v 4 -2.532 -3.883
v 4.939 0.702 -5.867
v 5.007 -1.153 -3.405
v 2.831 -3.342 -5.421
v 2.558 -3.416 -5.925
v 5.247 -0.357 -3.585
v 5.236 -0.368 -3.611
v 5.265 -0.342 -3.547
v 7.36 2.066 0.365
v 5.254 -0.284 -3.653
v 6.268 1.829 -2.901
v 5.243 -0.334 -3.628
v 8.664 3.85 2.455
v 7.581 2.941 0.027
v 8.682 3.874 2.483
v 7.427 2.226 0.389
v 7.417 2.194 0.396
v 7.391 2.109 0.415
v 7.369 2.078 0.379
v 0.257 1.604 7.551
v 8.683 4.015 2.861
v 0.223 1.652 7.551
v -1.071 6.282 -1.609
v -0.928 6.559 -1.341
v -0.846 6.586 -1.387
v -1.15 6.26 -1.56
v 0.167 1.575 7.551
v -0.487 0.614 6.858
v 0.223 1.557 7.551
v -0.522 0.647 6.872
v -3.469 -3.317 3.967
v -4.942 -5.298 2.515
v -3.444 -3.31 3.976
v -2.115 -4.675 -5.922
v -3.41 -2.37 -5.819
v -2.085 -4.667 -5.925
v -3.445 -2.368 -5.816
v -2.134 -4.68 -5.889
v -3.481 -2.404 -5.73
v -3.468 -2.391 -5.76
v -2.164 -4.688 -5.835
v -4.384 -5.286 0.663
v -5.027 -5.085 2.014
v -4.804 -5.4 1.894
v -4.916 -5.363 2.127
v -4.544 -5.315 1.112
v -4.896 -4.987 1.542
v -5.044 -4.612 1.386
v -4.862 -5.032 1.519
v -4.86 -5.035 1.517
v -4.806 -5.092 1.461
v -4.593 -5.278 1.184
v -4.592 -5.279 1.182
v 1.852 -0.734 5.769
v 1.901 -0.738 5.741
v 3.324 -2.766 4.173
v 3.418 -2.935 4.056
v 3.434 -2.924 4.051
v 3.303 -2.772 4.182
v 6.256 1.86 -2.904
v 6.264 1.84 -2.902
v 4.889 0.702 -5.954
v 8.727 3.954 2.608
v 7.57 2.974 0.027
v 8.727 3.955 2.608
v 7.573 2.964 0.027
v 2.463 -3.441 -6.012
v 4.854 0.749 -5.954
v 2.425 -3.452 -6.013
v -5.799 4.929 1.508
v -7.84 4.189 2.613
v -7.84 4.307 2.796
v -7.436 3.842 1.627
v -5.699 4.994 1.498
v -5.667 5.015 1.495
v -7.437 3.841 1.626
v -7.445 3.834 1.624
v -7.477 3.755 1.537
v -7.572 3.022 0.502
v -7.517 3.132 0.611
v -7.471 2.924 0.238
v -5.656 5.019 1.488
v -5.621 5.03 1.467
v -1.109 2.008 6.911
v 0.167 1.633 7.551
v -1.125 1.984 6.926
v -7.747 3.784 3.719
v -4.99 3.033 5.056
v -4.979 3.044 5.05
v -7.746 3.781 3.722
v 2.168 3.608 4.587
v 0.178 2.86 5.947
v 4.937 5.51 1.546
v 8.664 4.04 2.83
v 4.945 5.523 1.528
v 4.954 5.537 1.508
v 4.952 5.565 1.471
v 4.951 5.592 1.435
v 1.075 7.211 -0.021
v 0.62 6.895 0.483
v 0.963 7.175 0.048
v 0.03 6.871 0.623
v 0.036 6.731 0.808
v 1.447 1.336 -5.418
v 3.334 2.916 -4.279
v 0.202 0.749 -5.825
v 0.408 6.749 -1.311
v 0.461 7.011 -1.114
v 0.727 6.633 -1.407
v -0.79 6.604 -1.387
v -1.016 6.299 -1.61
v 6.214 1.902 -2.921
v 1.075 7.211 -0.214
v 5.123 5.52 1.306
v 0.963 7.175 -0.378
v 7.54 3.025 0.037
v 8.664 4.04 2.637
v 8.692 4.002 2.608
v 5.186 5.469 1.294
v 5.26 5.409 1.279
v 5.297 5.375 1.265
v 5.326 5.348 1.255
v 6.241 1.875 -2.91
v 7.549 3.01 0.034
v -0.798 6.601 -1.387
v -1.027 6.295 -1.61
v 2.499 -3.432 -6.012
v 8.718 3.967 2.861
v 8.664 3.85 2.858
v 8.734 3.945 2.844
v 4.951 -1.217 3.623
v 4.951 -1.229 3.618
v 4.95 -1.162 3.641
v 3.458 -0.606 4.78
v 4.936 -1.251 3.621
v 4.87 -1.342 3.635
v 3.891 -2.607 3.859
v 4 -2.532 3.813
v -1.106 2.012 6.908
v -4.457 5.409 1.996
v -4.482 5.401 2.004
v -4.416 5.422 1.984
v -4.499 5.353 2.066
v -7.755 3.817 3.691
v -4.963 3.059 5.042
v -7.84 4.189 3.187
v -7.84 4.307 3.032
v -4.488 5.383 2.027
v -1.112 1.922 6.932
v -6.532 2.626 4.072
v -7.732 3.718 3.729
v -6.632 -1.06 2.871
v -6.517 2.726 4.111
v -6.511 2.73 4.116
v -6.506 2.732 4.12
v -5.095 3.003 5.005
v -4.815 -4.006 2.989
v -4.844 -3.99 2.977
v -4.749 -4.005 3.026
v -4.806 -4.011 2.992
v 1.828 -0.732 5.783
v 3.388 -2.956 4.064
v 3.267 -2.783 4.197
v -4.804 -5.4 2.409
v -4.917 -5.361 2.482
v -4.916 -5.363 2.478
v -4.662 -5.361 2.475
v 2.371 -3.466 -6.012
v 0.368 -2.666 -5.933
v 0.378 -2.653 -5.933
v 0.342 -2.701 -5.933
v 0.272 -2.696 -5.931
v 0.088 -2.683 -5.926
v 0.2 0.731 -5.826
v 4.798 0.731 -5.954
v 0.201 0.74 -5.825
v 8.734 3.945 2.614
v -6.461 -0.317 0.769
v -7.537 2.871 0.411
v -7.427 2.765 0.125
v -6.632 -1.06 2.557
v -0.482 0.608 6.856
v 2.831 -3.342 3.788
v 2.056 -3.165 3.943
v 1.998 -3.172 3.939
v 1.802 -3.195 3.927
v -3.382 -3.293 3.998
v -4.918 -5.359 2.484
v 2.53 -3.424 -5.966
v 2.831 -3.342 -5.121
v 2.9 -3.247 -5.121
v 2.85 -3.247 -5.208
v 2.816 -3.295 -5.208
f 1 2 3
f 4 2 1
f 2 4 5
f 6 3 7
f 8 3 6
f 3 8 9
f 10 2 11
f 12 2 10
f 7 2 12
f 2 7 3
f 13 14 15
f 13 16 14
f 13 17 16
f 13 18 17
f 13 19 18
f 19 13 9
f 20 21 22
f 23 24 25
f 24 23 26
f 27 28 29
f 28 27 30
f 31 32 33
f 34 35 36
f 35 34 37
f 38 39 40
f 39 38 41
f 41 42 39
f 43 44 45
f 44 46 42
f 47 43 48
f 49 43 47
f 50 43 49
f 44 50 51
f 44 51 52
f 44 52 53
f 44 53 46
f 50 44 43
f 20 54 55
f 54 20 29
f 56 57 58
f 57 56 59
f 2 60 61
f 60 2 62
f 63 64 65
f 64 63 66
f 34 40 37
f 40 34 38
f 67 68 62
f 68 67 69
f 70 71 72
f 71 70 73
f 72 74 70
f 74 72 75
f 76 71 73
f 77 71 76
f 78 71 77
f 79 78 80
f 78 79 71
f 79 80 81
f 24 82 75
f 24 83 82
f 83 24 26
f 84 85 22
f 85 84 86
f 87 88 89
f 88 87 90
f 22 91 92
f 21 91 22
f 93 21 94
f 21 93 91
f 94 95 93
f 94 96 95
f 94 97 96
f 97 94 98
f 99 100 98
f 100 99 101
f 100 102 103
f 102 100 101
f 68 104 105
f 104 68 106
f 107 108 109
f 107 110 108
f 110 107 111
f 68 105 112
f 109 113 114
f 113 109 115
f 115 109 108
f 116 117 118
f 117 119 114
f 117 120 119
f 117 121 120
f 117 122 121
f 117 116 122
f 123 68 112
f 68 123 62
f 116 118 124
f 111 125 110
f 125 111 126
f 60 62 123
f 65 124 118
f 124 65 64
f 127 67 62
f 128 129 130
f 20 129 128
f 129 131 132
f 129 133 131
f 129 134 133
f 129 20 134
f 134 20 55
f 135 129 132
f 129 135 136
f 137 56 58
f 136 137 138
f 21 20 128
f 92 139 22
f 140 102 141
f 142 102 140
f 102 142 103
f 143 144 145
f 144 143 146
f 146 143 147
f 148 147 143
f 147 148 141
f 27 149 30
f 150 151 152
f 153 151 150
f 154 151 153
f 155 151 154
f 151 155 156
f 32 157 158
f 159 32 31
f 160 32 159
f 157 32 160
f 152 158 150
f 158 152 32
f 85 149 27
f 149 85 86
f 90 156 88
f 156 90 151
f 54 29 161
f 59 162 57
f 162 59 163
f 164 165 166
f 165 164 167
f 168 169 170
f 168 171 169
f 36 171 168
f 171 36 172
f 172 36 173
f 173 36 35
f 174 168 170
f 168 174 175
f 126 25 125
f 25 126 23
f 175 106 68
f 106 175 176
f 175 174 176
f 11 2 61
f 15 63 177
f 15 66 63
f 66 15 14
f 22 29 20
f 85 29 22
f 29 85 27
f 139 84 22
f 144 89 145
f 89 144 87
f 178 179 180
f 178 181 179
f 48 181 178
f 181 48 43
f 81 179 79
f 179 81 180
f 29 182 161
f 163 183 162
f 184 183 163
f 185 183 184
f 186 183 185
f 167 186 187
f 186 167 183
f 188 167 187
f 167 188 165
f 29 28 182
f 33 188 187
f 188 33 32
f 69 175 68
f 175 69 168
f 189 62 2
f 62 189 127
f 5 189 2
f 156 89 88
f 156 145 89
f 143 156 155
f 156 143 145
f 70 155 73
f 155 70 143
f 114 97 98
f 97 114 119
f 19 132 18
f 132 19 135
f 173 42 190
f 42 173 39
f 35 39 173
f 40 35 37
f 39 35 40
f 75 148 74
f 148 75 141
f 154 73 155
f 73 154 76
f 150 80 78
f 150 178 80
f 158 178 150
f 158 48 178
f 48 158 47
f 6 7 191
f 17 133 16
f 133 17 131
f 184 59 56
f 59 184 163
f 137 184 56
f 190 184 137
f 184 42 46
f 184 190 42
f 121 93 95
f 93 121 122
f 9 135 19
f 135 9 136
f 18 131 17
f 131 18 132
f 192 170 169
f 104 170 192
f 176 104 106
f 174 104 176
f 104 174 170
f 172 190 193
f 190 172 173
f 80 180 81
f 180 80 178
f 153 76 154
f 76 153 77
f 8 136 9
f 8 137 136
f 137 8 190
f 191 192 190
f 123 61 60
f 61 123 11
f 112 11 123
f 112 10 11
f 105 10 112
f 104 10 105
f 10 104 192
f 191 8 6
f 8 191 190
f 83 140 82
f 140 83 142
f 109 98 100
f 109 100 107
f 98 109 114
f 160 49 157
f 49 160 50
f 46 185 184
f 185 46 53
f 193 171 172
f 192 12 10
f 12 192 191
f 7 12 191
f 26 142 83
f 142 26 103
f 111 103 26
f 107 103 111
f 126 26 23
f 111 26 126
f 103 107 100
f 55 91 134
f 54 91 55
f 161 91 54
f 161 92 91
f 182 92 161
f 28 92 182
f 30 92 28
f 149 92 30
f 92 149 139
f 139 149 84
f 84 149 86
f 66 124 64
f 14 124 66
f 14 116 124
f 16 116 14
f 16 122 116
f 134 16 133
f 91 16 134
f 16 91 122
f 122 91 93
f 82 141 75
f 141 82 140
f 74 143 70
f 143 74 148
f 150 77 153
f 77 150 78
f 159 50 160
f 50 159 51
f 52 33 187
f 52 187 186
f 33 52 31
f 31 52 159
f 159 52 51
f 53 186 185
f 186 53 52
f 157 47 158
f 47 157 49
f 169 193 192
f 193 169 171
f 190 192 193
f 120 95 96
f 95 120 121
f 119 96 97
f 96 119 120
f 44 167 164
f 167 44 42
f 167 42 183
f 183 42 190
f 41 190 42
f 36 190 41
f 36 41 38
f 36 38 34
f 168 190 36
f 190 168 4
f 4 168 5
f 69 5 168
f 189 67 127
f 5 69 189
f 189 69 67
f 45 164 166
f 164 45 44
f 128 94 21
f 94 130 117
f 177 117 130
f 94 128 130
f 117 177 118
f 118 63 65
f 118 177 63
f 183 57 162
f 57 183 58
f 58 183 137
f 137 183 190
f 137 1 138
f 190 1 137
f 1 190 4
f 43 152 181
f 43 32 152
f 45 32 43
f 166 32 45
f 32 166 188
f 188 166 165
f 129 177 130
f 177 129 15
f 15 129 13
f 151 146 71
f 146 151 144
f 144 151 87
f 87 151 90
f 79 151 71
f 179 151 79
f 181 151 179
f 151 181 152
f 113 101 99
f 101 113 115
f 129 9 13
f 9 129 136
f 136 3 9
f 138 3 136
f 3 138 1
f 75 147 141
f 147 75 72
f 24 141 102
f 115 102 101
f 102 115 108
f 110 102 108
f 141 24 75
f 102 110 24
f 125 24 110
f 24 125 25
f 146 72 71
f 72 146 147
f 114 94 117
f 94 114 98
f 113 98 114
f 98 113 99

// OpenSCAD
// Auto-generated OpenSCAD file

    inner_points = 10*[[0.3968794289832836, -0.24366904809970863, 0.47769744652866364], [0.1044370337410087, 0.7116152041618212, 0.43400027446809336], [0.28001866757022104, -0.32472141302800633, -0.512137931997225], [-0.012423727672053866, 0.6305628392335235, -0.5558351040577953], [-0.483509439683674, -0.5304611105401444, 0.0999862435594168], [-0.7759518349259489, 0.4248231417213853, 0.05628907149884649], [-0.45353704140965617, 0.039673656440986374, 0.9209905083602004], [-0.6550920403237519, -0.10012099428325462, -0.7862229842742783], [0.8633541457398265, 0.39452214456670354, -0.13476752408592219]];

    outer_points = 10*[[0.5060778848187576, -0.5313859144211572, 0.21177232535318735], [0.4838884138968741, 0.07018910183659147, -0.5867357379715961], [-0.4935362337764729, -0.5313859144211572, 0.2395502645330591], [-0.5157257046983563, 0.07018910183659147, -0.5589577987917242], [0.020742555340540487, 0.1604093044556914, 0.7464395051009286], [-0.0014469155813429608, 0.76198432071344, -0.05206855822385477], [0.8703596761375976, 0.39772341860368887, 0.275448253298233], [-0.8537196482801497, 0.39772341860368887, 0.3233581114365443], [-0.016640027857447785, -0.7954468372073777, -0.5988063647347773]];

    // Convex hull for inner set (I)
    module inner_hull() {
        hull() {
            for (p = inner_points) {
                translate(p) sphere(r=0.1);
            }
        }
    }

    // Convex hull for outer set (O) minus inner hull (O \ I)
    module outer_minus_inner() {
        difference() {
            hull() {
                for (p = outer_points) {
                    translate(p) sphere(r=0.1);
                }
            }
            inner_hull(); // Subtract inner hull
        }
    }

    // Convex hull for outer set (O) minus all translated inner hulls
    module outer_minus_AllTranslationInner() {
        difference() {
            hull() {
                for (p = outer_points) {
                    translate(p) sphere(r=0.1);
                }
            }
            hull() {
                translate([0,0,50]) inner_hull();
                translate([0,0,-50]) inner_hull();
            }; // Subtract translated inner hulls
        }
    }

    // Difference between outer_minus_inner and outer_minus_AllTranslationInner
    module outer_minus_inner_diff() {
        difference() {
            // Outer minus inner
            difference() {
                hull() {
                    for (p = outer_points) {
                        translate(p) sphere(r=0.1);
                    }
                }
                inner_hull();
            }

            // Subtract Outer minus AllTranslationInner
            difference() {
                hull() {
                    for (p = outer_points) {
                        translate(p) sphere(r=0.1);
                    }
                }
                hull() {
                    translate([0,0,50]) inner_hull();
                    translate([0,0,-50]) inner_hull();
                };
            }
        }
    }

    // Rendering all with colors applied
    color([1, 1, 0, 1]) outer_minus_inner_diff(); // Opaque yellow
    
